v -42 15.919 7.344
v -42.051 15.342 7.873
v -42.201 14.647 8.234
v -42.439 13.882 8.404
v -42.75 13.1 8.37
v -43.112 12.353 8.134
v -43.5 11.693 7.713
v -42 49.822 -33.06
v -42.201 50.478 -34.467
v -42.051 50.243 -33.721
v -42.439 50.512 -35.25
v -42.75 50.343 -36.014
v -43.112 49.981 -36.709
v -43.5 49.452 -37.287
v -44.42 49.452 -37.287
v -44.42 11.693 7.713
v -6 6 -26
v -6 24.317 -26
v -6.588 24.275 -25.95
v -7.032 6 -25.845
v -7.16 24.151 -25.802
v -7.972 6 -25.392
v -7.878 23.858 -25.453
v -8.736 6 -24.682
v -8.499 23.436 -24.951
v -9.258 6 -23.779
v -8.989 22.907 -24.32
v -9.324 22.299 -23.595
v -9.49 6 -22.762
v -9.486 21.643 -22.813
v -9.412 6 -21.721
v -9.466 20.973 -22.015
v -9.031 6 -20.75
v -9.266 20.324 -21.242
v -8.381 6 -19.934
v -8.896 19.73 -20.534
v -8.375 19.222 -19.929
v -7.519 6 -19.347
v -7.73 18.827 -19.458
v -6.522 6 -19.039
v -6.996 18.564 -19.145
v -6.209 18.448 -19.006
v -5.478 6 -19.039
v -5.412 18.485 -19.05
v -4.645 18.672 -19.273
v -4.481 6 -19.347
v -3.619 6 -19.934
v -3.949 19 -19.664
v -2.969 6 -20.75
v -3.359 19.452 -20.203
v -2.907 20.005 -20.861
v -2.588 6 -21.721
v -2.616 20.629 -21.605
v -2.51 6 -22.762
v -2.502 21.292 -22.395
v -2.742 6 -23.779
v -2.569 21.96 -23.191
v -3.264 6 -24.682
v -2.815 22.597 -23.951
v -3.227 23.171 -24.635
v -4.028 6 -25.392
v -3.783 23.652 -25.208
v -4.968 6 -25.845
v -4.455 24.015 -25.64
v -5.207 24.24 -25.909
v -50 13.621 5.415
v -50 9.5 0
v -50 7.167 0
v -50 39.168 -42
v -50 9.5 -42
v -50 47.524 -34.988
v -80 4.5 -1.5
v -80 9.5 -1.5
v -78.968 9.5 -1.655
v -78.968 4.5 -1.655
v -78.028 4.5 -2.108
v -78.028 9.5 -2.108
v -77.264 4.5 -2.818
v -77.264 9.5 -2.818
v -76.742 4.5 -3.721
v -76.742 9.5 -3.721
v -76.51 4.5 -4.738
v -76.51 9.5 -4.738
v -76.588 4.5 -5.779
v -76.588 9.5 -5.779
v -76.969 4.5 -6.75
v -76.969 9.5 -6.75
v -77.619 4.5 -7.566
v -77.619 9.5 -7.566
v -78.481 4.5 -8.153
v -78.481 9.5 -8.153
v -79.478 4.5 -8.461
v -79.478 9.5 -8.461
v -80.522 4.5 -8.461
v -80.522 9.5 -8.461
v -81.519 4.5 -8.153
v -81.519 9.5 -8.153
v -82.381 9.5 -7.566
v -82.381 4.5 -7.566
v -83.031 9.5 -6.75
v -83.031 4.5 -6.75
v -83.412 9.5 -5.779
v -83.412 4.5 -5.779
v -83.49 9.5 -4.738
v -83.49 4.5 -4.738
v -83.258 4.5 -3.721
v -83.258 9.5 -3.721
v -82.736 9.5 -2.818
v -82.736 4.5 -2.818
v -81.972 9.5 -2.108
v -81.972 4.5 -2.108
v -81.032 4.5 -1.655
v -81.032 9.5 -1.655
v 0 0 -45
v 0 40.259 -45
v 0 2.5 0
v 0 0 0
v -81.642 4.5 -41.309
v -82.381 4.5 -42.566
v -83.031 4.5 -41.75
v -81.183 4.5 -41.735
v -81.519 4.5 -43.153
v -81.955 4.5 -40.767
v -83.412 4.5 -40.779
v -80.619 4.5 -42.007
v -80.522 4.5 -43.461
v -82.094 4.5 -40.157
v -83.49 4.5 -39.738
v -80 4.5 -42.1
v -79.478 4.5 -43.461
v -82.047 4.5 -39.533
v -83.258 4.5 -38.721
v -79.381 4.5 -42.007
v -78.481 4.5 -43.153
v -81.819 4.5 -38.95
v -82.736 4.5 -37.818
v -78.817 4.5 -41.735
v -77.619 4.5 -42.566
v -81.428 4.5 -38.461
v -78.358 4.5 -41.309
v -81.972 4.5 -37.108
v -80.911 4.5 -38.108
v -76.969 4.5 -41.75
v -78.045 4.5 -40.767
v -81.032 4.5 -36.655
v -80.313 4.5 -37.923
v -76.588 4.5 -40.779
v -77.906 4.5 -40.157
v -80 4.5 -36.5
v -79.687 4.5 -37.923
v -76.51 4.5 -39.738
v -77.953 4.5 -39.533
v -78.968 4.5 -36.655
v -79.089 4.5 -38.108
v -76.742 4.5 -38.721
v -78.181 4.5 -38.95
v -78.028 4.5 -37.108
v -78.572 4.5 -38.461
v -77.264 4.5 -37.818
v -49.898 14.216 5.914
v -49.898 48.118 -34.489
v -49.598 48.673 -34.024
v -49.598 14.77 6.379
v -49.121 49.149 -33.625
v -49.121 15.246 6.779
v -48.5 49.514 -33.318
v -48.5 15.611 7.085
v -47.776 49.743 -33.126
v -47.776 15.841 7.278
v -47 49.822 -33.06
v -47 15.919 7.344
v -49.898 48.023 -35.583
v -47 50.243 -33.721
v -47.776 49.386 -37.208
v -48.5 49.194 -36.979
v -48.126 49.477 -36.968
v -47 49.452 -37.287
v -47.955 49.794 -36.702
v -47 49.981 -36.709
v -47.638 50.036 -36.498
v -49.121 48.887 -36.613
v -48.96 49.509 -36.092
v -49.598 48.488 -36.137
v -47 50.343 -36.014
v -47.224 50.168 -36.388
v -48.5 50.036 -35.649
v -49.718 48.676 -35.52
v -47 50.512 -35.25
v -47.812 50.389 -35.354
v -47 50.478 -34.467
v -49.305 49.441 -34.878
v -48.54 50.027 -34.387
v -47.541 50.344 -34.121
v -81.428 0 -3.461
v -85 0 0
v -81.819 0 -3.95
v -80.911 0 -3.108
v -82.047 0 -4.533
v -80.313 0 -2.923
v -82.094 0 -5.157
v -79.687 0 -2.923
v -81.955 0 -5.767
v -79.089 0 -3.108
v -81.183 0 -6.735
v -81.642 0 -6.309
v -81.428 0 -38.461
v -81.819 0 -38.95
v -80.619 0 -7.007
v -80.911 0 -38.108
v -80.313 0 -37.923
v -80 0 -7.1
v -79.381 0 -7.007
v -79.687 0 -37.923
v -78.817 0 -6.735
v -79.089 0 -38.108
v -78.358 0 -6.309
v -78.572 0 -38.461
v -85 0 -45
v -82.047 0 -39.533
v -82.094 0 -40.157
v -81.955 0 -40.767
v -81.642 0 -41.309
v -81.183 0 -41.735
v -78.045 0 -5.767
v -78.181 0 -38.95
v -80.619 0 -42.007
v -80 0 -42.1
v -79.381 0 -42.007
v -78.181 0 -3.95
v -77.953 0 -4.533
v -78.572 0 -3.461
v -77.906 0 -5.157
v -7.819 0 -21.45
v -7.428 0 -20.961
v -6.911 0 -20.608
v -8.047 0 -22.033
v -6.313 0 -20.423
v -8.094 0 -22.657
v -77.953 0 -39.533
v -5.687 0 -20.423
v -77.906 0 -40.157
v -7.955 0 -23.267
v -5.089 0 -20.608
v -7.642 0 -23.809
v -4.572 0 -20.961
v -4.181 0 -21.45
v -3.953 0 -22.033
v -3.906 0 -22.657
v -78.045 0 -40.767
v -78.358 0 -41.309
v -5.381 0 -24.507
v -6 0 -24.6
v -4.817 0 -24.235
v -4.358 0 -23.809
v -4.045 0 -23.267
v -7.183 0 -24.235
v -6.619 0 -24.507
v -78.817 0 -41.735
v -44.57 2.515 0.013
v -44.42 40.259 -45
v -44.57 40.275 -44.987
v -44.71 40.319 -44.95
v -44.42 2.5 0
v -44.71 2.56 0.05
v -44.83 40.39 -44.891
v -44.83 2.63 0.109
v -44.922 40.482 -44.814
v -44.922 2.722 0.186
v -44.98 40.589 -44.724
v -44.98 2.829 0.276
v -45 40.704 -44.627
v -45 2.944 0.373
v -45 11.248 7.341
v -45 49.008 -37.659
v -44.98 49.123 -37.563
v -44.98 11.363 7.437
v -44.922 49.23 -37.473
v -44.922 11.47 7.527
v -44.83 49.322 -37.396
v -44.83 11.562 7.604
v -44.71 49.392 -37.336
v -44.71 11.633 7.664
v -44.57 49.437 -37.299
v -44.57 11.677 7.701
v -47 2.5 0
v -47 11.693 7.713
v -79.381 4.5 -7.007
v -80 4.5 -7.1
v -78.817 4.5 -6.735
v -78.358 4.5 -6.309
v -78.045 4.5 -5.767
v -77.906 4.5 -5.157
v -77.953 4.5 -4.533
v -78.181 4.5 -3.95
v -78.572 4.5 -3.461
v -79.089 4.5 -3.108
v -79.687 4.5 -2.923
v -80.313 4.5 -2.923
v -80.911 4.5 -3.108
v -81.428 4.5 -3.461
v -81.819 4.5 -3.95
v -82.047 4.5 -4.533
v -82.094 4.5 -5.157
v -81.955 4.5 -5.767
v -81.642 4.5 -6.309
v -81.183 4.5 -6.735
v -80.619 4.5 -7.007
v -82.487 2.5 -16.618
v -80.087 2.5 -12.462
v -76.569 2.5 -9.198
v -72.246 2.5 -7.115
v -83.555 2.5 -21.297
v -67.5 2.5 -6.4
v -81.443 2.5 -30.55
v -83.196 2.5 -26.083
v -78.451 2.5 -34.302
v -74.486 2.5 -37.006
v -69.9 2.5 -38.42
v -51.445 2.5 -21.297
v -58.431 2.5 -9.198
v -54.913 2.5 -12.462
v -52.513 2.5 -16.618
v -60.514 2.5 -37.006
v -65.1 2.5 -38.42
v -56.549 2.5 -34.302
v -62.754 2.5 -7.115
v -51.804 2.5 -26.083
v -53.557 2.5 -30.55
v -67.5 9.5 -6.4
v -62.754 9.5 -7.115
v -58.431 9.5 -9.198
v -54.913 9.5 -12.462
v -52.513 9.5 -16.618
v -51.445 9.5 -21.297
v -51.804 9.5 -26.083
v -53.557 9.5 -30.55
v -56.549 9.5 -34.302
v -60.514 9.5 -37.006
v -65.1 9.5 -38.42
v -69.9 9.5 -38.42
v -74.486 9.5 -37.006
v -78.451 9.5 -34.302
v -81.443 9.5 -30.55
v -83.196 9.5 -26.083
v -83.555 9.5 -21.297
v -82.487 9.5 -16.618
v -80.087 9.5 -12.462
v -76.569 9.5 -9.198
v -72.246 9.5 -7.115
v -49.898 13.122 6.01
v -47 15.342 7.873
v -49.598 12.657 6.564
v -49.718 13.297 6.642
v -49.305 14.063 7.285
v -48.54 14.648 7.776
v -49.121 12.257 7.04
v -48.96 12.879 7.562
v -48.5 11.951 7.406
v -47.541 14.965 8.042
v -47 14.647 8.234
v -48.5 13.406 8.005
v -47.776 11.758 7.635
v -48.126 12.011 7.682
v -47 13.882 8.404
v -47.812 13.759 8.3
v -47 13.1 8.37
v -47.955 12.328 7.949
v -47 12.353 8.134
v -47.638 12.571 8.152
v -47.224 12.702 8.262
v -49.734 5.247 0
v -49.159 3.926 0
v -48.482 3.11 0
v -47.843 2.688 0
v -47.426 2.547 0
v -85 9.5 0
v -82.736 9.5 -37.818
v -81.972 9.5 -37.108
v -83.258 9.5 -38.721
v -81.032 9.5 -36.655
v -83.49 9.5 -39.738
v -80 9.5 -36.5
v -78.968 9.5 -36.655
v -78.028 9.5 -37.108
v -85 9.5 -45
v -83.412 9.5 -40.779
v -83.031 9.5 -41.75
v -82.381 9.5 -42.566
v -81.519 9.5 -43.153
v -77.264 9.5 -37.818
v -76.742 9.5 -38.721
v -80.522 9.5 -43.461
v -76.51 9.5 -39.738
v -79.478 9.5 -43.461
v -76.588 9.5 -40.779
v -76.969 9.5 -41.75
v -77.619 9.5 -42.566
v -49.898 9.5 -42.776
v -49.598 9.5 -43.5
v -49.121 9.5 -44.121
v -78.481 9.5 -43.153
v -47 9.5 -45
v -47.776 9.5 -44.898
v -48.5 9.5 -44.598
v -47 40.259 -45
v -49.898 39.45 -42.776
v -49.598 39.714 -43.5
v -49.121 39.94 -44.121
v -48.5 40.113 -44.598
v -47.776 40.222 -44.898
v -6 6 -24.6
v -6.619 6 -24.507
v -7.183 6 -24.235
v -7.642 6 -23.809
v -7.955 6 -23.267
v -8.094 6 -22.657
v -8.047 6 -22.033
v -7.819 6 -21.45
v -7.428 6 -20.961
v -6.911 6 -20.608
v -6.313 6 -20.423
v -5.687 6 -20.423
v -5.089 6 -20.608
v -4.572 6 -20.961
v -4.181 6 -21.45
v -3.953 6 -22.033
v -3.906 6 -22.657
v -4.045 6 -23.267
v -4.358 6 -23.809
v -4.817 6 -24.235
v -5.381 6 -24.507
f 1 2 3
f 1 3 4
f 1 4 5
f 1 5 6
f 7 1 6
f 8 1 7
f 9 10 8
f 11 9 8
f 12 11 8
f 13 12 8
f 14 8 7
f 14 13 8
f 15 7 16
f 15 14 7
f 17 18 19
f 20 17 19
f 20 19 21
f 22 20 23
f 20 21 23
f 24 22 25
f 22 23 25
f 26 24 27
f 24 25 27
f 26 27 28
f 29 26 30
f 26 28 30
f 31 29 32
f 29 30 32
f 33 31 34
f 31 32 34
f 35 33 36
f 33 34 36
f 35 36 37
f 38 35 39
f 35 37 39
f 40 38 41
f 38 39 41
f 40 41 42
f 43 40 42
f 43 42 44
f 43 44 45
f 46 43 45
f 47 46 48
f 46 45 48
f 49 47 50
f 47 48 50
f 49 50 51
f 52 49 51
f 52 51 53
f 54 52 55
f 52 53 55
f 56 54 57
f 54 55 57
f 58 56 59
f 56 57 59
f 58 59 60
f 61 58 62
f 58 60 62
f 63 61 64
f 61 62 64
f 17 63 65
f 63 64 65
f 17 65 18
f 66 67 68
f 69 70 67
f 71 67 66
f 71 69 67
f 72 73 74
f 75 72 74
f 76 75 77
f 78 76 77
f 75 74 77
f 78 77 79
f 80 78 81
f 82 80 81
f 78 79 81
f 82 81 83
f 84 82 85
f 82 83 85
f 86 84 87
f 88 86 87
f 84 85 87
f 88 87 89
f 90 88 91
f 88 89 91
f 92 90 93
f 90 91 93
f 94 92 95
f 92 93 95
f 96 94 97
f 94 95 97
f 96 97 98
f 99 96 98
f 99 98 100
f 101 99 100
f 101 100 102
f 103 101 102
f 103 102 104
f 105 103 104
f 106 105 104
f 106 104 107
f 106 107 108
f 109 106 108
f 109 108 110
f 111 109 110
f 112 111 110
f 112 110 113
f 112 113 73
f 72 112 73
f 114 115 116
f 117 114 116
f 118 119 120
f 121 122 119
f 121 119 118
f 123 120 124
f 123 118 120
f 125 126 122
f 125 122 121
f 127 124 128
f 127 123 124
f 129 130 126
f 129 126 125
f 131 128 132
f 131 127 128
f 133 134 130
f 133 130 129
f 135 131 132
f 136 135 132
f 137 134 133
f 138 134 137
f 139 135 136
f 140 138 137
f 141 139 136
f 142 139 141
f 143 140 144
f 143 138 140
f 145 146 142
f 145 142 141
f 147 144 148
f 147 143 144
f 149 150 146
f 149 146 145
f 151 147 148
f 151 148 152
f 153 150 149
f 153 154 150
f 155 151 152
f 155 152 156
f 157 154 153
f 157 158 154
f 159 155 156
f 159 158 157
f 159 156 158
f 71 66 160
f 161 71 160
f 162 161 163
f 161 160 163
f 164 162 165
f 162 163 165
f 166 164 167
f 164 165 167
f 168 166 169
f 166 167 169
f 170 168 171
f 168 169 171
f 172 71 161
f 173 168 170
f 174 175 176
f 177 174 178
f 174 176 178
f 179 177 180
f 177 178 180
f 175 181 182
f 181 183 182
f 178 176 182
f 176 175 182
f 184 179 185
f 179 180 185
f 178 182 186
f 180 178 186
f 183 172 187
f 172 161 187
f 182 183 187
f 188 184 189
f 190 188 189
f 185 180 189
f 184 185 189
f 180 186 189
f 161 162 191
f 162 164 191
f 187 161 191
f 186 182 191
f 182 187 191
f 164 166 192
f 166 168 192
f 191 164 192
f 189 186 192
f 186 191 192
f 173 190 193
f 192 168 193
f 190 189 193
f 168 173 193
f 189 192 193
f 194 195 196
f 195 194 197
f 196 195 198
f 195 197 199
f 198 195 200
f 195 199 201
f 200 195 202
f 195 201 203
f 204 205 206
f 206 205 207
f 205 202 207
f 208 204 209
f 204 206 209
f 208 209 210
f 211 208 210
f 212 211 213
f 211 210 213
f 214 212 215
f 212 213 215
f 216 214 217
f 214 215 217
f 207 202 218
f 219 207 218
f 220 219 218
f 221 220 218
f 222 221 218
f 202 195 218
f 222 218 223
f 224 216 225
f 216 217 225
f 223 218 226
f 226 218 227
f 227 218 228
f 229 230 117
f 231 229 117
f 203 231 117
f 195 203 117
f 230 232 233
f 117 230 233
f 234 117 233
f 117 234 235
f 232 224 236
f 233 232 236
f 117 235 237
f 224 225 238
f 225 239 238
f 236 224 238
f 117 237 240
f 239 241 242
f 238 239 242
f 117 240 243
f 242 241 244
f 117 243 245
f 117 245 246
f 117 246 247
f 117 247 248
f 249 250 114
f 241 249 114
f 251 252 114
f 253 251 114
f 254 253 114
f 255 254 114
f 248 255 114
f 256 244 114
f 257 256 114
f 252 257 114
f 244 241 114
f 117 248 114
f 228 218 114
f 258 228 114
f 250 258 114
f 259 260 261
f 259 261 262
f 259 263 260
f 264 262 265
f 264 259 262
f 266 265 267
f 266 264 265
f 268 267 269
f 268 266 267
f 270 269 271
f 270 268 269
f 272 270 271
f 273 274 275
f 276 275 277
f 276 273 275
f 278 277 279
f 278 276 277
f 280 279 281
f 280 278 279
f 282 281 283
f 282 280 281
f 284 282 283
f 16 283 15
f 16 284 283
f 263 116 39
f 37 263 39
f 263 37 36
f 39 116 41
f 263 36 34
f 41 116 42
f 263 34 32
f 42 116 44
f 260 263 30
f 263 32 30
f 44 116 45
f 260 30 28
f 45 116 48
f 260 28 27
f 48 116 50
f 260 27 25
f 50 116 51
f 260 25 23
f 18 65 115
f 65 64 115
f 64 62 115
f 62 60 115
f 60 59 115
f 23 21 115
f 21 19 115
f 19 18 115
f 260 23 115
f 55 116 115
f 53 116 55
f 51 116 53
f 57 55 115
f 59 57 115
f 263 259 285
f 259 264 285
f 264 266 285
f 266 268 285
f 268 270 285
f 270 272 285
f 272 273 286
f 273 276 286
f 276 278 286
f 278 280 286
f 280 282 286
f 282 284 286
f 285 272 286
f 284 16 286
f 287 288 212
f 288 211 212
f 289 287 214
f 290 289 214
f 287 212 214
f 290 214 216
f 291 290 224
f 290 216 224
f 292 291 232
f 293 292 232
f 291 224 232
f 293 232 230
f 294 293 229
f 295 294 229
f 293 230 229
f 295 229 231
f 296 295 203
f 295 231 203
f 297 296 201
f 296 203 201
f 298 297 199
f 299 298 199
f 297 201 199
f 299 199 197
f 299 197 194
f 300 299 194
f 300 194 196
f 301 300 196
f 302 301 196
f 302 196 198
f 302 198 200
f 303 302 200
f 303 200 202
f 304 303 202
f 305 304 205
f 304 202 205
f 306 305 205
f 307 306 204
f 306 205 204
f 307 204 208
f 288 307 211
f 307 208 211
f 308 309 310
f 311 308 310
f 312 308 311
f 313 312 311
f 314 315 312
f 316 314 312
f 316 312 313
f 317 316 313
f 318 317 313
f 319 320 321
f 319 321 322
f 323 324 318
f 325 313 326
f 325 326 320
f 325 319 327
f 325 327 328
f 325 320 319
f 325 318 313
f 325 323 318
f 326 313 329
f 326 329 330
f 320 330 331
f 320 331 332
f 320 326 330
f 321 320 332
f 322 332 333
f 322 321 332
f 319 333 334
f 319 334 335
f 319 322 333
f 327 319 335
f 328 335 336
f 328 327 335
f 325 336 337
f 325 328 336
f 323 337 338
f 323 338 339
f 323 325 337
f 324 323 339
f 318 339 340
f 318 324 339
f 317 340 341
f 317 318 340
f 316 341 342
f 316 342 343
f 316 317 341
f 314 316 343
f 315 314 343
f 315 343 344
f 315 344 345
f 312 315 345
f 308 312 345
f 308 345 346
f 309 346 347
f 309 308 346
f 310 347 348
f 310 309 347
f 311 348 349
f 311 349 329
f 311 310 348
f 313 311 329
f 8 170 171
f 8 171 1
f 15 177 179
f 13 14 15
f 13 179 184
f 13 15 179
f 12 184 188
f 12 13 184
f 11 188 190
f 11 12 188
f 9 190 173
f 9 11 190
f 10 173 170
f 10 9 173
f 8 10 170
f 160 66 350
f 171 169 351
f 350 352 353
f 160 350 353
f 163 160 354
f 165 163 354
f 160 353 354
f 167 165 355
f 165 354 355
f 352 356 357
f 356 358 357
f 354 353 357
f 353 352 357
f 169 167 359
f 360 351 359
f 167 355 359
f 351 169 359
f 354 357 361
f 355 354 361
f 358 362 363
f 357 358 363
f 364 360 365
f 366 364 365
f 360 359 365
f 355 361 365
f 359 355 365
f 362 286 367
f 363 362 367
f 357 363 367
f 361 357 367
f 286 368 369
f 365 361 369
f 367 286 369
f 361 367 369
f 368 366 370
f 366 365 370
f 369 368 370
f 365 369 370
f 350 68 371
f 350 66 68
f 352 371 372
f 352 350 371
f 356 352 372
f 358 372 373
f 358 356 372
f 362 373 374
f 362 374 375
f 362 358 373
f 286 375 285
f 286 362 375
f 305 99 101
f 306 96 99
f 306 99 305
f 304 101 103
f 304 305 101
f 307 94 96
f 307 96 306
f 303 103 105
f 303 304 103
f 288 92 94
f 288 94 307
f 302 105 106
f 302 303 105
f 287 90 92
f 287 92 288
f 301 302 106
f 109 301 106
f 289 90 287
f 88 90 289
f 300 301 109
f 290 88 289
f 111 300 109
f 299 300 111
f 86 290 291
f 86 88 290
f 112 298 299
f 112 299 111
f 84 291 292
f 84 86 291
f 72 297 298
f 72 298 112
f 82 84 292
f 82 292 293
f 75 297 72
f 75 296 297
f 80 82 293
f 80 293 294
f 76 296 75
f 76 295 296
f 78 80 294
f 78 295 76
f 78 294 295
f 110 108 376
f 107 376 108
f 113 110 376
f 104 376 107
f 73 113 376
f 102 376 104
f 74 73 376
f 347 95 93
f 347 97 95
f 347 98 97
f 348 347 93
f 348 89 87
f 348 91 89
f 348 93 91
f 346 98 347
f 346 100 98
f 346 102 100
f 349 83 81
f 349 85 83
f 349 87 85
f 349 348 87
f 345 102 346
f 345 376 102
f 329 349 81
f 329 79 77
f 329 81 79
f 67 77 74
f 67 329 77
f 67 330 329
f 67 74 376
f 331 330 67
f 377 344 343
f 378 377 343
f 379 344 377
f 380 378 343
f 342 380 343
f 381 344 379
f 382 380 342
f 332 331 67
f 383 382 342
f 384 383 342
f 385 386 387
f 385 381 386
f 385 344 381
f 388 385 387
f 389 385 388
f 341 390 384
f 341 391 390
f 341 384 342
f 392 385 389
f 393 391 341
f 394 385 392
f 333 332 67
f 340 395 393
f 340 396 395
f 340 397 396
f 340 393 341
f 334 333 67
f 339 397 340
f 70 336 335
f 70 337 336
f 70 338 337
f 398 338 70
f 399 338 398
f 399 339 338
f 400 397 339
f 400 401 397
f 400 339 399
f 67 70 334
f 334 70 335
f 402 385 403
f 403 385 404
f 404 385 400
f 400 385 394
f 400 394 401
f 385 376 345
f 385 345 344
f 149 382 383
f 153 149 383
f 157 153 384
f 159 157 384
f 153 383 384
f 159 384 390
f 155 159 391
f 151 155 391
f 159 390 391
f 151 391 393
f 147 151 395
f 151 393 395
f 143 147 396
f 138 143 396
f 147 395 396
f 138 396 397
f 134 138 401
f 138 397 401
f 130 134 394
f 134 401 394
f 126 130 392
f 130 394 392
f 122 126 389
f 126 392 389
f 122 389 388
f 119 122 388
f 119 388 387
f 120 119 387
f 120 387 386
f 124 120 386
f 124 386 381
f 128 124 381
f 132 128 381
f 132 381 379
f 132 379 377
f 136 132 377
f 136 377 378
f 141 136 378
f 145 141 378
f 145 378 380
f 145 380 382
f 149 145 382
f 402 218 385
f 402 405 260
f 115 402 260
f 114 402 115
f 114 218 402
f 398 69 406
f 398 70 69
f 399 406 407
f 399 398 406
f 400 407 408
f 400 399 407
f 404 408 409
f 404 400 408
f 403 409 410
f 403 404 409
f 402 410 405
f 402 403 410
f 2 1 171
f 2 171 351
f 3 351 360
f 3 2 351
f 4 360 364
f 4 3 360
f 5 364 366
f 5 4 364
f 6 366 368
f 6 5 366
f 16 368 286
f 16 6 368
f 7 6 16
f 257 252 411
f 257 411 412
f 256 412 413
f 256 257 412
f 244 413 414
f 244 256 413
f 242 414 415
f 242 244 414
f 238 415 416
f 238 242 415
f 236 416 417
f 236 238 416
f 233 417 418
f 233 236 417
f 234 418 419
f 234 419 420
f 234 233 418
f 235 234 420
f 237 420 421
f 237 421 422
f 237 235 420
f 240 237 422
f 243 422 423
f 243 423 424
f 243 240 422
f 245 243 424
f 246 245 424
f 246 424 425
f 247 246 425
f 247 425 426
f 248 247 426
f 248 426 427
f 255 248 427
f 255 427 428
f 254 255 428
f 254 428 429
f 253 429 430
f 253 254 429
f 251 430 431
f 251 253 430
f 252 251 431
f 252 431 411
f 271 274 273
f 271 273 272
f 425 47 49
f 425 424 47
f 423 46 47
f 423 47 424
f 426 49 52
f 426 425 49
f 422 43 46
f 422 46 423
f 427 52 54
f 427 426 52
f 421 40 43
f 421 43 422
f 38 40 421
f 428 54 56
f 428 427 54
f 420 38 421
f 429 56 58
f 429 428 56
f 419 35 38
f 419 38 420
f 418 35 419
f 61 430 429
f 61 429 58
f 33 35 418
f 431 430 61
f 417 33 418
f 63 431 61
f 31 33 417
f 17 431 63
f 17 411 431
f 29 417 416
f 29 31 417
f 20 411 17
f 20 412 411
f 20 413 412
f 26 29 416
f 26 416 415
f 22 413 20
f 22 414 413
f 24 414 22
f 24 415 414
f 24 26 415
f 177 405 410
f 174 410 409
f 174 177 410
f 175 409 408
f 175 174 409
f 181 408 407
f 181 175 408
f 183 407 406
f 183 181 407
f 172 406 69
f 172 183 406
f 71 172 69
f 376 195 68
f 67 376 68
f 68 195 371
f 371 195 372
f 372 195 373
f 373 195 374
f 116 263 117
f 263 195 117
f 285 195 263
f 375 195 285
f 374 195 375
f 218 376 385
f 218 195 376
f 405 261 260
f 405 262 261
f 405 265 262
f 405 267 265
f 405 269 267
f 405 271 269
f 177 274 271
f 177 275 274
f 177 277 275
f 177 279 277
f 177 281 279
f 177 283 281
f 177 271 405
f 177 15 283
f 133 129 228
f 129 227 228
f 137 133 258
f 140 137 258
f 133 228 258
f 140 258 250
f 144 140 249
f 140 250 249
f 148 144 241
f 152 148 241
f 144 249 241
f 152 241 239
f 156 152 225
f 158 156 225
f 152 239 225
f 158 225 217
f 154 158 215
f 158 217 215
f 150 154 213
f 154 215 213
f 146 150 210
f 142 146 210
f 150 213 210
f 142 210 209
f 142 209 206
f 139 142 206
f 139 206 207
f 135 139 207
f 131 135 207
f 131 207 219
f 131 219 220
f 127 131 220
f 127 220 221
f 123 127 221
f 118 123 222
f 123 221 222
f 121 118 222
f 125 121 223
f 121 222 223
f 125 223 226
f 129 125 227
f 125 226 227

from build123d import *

# Parameters (mm, degrees)
SKETCH1_W           = 85
SKETCH1_H           = 45
BOSS_EXTRUDE1_DEPTH = 2.5
BOSS_EXTRUDE2_DEPTH = 50
BOSS_EXTRUDE3_DEPTH = 58.743328
SKETCH4_W           = 35
SKETCH4_H           = 45
SKETCH4_R           = 16.1
BOSS_EXTRUDE4_DEPTH = 7
HOLE1_D             = 4.2
HOLE1_DEPTH         = 20
HOLE1_CBORE_D       = 7
HOLE1_CBORE_DEPTH   = 5
FILLET4_R           = 3
FILLET5_R           = 3
FILLET6_R           = 3
FILLET7_R           = 0.58


with BuildPart() as part:
    # Sketch1 → Boss-Extrude1 (new body)
    with BuildSketch(Plane(origin=(0, 0, 0), x_dir=(1, 0, 0), z_dir=(0, 1, 0))):
        with Locations((-42.5, 22.5)):
            Rectangle(SKETCH1_W, SKETCH1_H)
    extrude(amount=BOSS_EXTRUDE1_DEPTH)

    # Sketch2 → Boss-Extrude2 (add)
    with BuildSketch(Plane(origin=(0, 0, 0), x_dir=(0, 0, -1), z_dir=(1, 0, 0))):
        Polygon((0, 2.5), (45, 40.259483403), (45, 2.5), align=None)
    extrude(amount=-BOSS_EXTRUDE2_DEPTH)

    # Sketch3 → Boss-Extrude3 (add)
    with BuildSketch(Plane(origin=(-50, 40.259483403, -45), x_dir=(1, 0, 0), z_dir=(0, -0.6427876096865354, 0.7660444431189815))):
        Polygon((0, 0), (0, 15), (8, 15), (6.5, 12), (5, 12), (5, 0), align=None)
    extrude(amount=BOSS_EXTRUDE3_DEPTH)

    # Sketch4 → Boss-Extrude4 (add)
    with BuildSketch(Plane(origin=(0, 2.5, 0), x_dir=(1, 0, 0), z_dir=(0, 1, 0))):
        with Locations((-67.5, 22.5)):
            Rectangle(SKETCH4_W, SKETCH4_H)
        with Locations(Location((-67.5, 22.5, 0), (0, 0, 270))):
            Circle(SKETCH4_R, mode=Mode.SUBTRACT)
    extrude(amount=BOSS_EXTRUDE4_DEPTH)

    # Hole1
    with Locations(Plane(origin=(-80, 9.5, -40), x_dir=(0, 0, 1), z_dir=(0, 1, 0))):
        with Locations((0, 0), (35, 0)):
            CounterBoreHole(HOLE1_D / 2, HOLE1_CBORE_D / 2, HOLE1_CBORE_DEPTH, depth=HOLE1_DEPTH)

    # Sketch8 → Cut-Revolve1 (revolve, cut)
    with BuildSketch(Plane.XY.offset(-22.5), mode=Mode.PRIVATE) as cut_revolve1_sk:
        Polygon((-2.5, 21.379741701), (-2.5, 6), (-3.9, 6), (-3.9, -6.519563006), (-6, -6.519563006), (-6, 21.379741701), (-6, 29.263564953), (-2.5, 29.263564953), align=None)
    revolve(cut_revolve1_sk.sketch.rotate(Axis((-6, -6.519563006, -22.5), (0, 1, 0)), 90), axis=Axis((-6, -6.519563006, -22.5), (0, 1, 0)), mode=Mode.SUBTRACT)

    # Fillet4
    fillet4_edges = [part.edges().sort_by_distance(p)[0] for p in [
        (-50, 32.870408355, -12.858185862),
    ]]
    fillet(fillet4_edges, radius=FILLET4_R)

    # Fillet5
    fillet5_edges = [part.edges().sort_by_distance(p)[0] for p in [
        (-44.5, 51.75015005, -35.358185855),
        (-49.121320344, 51.077042382, -35.922990251),
        (-50, 44.855750062, -41.143274342),
        (-50, 24.879741701, -45),
    ]]
    fillet(fillet5_edges, radius=FILLET5_R)

    # Fillet6
    fillet6_edges = [part.edges().sort_by_distance(p)[0] for p in [
        (-44.5, 13.99066666, 9.64181413),
        (-49.121320344, 13.317558992, 9.077009734),
        (-50, 7.096266672, 3.856725643),
    ]]
    fillet(fillet6_edges, radius=FILLET6_R)

    # Fillet7
    fillet7_edges = [part.edges().sort_by_distance(p)[0] for p in [
        (-45, 21.379741708, -22.500000008),
        (-45, 30.572275025, -14.786548691),
    ]]
    fillet(fillet7_edges, radius=FILLET7_R)


solid = part.part
